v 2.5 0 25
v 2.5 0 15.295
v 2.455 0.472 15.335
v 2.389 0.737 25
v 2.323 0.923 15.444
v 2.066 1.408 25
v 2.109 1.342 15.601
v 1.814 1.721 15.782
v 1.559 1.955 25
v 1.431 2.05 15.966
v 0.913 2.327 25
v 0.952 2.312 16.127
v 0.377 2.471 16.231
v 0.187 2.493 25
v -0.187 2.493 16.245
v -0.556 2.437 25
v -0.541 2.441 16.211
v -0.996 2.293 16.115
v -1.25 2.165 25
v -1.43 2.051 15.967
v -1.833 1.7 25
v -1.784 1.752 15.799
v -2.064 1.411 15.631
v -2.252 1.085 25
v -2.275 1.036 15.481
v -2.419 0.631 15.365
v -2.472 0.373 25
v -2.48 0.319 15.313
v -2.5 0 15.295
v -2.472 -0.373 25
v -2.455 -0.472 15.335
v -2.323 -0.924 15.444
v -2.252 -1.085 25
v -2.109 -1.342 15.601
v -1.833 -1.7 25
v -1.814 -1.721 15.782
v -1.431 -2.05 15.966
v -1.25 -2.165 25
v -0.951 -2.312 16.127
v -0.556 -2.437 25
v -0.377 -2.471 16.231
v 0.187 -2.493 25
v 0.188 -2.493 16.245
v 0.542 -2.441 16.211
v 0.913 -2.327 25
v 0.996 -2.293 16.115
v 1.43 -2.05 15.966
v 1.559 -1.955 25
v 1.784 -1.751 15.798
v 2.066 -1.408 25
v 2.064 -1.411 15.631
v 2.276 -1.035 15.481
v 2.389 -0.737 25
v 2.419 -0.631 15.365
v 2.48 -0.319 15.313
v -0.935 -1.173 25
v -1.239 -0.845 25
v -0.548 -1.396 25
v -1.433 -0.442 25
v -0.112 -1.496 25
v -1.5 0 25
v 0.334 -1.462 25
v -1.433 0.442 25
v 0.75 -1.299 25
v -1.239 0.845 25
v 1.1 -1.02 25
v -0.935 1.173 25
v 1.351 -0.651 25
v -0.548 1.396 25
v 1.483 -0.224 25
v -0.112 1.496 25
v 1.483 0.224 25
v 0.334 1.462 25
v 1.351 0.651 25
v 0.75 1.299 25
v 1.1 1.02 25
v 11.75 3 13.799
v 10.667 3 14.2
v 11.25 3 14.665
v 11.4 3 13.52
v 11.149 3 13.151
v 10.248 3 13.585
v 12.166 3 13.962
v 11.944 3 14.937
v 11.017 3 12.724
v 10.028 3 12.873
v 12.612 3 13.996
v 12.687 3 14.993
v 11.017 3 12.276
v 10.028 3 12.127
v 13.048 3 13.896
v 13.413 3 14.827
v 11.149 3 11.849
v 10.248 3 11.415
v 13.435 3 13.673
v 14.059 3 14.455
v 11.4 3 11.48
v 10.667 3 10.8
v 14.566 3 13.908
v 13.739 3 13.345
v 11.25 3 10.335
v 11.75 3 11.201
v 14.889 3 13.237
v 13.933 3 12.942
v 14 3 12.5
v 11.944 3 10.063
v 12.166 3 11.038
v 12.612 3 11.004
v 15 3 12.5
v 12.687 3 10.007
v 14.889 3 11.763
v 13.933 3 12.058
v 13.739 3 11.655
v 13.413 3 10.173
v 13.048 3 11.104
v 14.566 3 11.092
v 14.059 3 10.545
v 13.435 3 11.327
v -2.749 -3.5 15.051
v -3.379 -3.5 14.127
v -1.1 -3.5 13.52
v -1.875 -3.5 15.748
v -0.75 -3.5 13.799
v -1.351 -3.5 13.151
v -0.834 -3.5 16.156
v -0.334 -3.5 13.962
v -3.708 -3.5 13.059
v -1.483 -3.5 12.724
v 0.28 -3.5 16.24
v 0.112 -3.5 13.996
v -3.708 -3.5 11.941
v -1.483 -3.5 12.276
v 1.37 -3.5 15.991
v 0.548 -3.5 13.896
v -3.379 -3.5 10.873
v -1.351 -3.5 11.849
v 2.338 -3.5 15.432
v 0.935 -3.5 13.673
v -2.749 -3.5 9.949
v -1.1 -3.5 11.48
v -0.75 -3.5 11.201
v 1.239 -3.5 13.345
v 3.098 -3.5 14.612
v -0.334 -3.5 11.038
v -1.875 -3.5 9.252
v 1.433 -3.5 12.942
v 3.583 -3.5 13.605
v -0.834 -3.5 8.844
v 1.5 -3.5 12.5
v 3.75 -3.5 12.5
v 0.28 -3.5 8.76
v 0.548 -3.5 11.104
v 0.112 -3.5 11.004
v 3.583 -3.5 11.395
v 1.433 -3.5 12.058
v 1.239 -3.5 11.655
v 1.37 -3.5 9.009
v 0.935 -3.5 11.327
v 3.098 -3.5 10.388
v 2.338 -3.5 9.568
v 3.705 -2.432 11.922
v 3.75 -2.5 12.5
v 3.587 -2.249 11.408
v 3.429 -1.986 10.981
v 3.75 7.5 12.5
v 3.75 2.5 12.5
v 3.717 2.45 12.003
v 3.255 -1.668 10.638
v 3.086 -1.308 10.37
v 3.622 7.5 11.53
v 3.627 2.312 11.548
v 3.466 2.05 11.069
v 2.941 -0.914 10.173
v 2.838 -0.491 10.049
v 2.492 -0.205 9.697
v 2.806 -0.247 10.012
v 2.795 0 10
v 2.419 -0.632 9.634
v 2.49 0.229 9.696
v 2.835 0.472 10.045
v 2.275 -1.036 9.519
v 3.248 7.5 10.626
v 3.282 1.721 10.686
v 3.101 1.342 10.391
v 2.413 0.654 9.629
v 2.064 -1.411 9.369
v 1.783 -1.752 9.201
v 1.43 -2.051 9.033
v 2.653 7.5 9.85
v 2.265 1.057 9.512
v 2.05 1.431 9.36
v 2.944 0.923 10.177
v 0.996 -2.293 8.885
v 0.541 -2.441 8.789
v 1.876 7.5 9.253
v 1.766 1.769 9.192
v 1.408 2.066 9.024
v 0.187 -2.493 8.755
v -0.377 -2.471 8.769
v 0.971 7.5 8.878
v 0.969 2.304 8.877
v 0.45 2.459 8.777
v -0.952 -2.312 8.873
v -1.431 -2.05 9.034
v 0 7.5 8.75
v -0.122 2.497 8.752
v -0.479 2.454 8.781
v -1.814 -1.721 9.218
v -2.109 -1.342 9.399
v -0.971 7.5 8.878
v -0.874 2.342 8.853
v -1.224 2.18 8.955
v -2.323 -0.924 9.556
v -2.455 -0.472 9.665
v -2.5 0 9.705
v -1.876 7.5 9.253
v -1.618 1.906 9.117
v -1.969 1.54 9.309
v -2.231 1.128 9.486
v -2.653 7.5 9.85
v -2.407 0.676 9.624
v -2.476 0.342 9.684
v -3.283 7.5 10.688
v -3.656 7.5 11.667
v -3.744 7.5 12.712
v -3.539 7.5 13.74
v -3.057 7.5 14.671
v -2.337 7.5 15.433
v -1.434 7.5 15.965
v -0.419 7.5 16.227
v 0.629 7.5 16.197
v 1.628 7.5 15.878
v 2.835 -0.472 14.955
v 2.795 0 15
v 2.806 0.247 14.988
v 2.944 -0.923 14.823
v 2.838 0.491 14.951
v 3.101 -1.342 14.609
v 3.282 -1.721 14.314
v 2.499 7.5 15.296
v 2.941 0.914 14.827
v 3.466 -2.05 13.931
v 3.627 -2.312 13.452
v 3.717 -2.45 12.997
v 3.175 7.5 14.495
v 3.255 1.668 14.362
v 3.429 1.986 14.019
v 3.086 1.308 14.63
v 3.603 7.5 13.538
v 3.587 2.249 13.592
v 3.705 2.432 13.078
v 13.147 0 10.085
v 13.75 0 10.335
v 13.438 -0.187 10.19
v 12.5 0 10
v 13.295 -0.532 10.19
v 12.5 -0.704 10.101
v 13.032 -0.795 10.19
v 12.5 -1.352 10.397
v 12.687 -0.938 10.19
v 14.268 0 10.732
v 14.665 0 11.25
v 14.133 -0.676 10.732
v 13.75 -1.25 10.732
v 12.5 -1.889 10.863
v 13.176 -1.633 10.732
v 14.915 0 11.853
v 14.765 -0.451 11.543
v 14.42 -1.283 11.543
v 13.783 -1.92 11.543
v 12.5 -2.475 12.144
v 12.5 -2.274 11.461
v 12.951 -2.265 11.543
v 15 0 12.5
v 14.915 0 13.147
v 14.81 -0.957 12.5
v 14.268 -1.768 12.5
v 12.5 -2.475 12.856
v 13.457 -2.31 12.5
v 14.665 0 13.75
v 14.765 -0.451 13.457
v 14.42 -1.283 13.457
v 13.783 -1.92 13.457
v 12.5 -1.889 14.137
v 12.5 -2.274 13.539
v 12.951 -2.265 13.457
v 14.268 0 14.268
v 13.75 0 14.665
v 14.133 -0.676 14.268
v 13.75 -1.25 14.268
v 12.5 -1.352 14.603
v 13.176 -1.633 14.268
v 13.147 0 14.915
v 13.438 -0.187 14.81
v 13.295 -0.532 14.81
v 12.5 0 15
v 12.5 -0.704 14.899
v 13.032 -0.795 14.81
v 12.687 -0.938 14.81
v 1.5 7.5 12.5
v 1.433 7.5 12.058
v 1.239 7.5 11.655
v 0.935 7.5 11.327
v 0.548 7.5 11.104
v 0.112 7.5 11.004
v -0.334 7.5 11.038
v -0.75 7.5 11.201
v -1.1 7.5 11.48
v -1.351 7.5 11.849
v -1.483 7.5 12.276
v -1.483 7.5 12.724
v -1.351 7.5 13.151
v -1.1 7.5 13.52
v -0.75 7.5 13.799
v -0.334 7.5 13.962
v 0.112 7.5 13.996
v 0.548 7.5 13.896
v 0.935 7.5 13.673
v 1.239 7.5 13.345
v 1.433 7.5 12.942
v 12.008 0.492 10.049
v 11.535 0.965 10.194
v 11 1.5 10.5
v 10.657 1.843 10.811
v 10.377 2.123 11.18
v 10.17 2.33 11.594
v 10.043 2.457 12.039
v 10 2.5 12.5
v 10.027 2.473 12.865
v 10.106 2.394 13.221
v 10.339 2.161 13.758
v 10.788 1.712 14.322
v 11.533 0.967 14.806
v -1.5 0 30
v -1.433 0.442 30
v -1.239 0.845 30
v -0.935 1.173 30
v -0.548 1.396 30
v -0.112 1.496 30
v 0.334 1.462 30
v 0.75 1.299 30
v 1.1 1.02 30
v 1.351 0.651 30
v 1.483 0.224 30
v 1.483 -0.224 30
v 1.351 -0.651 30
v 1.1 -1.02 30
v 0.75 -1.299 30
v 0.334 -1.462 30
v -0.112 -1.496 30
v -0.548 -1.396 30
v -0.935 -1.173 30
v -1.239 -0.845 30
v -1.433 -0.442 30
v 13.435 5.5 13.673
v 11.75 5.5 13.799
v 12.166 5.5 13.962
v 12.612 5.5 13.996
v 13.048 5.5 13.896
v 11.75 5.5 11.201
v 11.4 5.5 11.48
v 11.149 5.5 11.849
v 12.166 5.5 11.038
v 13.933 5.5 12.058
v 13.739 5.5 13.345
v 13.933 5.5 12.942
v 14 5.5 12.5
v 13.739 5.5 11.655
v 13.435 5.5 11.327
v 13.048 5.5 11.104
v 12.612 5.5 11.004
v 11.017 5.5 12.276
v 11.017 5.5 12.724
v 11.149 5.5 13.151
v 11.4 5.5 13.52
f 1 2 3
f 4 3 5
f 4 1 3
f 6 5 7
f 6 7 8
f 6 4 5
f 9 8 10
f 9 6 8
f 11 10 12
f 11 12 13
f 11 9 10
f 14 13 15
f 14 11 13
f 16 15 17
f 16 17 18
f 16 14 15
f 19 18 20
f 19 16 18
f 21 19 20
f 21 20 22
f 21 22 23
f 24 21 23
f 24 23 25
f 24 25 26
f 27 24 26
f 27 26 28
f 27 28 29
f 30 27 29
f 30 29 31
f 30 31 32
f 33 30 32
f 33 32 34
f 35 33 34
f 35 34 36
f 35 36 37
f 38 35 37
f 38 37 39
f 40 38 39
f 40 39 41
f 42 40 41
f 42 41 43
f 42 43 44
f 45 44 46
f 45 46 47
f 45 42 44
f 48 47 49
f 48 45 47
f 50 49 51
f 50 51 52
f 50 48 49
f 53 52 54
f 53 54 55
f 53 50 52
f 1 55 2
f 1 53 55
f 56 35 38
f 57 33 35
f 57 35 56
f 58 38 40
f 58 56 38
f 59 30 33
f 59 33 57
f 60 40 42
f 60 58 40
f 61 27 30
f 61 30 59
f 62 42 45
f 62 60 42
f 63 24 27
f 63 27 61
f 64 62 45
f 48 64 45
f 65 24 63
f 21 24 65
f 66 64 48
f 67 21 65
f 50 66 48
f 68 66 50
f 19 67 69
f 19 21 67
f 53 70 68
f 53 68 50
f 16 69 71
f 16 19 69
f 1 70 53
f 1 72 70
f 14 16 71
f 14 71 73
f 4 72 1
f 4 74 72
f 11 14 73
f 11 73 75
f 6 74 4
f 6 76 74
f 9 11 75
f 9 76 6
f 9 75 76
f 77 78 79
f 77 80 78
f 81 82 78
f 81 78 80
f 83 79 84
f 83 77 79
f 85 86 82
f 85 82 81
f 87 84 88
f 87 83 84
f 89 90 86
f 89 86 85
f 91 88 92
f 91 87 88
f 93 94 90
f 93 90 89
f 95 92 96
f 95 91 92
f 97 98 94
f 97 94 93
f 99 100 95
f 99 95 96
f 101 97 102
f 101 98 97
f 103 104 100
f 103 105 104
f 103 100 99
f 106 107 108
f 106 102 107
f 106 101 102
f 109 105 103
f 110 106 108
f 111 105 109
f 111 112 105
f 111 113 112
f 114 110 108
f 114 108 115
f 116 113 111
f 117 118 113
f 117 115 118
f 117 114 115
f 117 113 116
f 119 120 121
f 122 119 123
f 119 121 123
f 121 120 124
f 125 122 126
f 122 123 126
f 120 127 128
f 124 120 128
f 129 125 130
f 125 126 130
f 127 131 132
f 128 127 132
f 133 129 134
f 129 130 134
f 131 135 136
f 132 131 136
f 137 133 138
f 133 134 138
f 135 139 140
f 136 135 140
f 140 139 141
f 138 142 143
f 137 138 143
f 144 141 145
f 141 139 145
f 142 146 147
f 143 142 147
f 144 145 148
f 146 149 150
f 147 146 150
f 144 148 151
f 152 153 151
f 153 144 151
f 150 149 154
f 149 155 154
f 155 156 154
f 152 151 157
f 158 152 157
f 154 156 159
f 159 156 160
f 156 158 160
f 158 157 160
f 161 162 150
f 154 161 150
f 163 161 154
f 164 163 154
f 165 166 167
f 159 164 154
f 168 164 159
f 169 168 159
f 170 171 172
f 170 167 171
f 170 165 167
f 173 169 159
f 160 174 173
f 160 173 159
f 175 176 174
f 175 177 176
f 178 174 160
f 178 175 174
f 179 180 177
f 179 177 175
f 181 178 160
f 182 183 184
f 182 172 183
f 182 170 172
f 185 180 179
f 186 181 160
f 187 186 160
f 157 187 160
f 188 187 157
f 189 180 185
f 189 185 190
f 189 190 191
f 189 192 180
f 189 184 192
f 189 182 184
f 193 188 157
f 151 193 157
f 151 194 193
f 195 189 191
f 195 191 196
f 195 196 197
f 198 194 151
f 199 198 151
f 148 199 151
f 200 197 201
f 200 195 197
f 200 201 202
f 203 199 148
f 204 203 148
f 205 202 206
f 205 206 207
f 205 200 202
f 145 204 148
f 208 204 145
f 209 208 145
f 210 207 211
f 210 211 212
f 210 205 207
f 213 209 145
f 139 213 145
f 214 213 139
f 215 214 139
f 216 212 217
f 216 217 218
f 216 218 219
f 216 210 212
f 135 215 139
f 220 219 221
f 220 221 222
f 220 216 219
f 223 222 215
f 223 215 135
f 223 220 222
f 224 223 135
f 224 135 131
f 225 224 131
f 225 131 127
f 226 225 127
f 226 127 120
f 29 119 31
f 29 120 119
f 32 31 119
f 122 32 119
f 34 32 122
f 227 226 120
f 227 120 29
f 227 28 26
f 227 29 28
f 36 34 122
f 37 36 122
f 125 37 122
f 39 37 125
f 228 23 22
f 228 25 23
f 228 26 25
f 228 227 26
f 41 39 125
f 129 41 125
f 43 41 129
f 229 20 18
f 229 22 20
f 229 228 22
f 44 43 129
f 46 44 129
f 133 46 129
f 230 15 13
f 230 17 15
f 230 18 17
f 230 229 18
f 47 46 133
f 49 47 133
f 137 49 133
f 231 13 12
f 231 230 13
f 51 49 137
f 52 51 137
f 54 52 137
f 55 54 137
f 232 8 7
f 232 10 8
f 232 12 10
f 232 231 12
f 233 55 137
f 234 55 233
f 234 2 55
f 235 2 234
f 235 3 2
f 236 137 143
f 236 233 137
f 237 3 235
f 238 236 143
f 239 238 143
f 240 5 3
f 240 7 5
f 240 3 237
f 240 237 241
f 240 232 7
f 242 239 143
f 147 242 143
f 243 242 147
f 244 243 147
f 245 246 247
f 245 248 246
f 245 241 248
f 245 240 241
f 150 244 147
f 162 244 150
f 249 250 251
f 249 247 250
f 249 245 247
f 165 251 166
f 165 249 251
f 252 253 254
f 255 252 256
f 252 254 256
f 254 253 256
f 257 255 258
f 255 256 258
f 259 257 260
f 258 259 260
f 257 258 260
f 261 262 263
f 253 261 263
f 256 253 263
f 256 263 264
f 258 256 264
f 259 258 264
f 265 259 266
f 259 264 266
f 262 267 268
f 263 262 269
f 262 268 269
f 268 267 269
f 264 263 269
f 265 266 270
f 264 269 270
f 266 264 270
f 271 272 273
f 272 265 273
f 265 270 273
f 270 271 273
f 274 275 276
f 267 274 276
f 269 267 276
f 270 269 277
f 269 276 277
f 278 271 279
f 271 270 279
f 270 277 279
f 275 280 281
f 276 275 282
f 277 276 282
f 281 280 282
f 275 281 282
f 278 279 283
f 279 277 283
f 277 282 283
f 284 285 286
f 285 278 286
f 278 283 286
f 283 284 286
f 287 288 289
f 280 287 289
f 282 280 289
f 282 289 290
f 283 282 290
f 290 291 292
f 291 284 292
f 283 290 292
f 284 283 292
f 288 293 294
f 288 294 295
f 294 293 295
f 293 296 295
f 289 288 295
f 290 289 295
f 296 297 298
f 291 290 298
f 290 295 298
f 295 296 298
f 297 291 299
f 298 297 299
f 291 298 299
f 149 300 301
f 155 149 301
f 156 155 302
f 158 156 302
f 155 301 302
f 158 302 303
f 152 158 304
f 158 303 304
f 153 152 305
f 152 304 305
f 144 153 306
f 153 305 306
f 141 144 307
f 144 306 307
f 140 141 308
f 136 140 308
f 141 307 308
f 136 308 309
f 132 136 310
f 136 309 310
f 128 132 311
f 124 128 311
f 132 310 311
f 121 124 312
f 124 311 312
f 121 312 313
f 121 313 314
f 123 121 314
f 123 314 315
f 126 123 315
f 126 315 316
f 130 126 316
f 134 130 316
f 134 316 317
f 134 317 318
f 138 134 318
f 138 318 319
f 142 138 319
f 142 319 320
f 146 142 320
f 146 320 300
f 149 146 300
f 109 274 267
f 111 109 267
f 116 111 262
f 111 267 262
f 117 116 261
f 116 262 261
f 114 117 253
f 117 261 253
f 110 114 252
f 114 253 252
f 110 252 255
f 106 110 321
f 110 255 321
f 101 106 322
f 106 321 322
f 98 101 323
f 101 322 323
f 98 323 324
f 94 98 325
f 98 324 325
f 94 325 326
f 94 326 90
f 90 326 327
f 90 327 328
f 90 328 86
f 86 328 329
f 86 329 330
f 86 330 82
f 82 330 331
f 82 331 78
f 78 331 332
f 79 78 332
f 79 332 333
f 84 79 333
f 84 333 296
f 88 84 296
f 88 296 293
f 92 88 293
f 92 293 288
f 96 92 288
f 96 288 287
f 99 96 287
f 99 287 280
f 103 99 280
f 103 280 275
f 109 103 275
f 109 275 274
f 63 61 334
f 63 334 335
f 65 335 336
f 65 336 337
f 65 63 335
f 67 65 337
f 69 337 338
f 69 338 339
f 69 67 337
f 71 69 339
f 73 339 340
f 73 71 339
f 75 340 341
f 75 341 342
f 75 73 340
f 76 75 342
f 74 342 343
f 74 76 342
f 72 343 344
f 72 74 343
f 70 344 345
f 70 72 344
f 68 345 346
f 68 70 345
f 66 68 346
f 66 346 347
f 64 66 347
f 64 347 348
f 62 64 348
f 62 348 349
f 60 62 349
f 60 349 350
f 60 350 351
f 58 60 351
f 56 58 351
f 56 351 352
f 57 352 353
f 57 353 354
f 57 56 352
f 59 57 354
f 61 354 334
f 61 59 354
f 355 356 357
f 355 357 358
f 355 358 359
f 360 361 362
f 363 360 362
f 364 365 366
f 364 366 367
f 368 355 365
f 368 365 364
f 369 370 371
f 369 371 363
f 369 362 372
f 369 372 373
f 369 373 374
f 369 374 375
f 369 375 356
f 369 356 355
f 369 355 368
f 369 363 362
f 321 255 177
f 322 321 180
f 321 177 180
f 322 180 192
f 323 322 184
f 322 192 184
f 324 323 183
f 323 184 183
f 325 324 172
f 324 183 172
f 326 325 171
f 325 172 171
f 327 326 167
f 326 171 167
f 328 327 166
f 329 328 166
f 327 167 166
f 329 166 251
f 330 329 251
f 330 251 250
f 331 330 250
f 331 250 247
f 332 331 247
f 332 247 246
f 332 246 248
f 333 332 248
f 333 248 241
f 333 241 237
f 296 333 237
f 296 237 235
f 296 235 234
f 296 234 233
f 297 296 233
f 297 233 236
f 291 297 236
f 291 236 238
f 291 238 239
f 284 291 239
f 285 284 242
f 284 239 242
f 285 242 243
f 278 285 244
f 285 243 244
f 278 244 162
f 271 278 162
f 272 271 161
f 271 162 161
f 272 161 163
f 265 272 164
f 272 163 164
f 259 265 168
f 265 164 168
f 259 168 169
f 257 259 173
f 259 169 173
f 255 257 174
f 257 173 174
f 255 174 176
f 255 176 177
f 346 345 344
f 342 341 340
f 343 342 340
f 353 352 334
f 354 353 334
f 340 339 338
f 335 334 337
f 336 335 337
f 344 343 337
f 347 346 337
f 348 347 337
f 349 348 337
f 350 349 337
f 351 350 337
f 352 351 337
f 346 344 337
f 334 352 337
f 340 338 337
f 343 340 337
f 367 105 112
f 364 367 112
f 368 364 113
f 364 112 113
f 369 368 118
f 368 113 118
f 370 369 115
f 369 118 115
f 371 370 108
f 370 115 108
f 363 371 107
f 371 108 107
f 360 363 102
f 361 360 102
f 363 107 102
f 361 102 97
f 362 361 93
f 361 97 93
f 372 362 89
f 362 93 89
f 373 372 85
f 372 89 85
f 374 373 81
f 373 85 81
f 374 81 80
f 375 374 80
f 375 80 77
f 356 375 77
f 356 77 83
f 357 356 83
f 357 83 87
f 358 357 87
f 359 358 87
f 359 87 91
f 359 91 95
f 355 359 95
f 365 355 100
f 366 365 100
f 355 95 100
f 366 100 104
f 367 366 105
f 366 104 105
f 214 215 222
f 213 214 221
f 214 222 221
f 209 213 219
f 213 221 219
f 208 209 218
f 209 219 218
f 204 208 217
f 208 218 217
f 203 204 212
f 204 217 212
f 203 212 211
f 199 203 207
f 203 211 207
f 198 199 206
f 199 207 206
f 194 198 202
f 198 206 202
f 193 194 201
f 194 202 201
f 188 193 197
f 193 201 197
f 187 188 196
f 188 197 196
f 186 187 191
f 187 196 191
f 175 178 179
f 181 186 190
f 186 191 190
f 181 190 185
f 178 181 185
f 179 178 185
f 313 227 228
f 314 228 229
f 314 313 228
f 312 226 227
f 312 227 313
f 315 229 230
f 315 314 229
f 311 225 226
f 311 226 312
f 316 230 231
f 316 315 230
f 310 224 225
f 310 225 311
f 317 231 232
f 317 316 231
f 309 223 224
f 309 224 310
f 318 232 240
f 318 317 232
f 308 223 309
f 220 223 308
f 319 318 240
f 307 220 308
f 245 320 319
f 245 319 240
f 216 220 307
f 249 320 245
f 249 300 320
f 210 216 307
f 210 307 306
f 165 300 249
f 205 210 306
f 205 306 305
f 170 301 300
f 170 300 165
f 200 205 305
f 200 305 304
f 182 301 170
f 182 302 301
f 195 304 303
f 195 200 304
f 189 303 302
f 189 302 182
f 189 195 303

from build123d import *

# Parameters (mm, degrees)
SKETCH1_R                = 2.5
BOSS_EXTRUDE1_DEPTH      = 12.5
SKETCH2_R                = 1.5
BOSS_EXTRUDE2_DEPTH      = 5
SKETCH4_R                = 2.5
BOSS_EXTRUDE3_DEPTH      = 12.5
SKETCH5_R                = 2.5
BOSS_EXTRUDE4_DEPTH      = 3
SKETCH6_R                = 1.5
BOSS_EXTRUDE5_DEPTH      = 2.5
REVOLVE2_ANGLE           = 90
REVOLVE3_ANGLE           = 90
SKETCH18_R               = 3.75
BOSS_EXTRUDE6_DEPTH      = 7.5
BOSS_EXTRUDE6_DEPTH_BACK = 3.5
SKETCH20_R               = 1.5
CUT_EXTRUDE2_DEPTH       = 1.0000001
CUT_EXTRUDE2_DEPTH_BACK  = 12.0000001
CUT_EXTRUDE3_DEPTH       = 1.0000001
CUT_EXTRUDE3_DEPTH_BACK  = 12.0000001


with BuildPart() as part:
    # Sketch1 → Boss-Extrude1 (new body)
    with BuildSketch(Plane.XY):
        Circle(SKETCH1_R)
    boss_extrude1 = extrude(amount=BOSS_EXTRUDE1_DEPTH)

    # Sketch2 → Boss-Extrude2 (add)
    with BuildSketch(Plane(origin=(0, 0, 0), x_dir=(-1, 0, 0), z_dir=(0, 0, -1))):
        Circle(SKETCH2_R)
    boss_extrude2 = extrude(amount=BOSS_EXTRUDE2_DEPTH)

    # Sketch4 → Boss-Extrude3 (add)
    with BuildSketch(Plane(origin=(0, 0, 0), x_dir=(0, 0, -1), z_dir=(1, 0, 0))):
        with Locations((-12.5, 0)):
            Circle(SKETCH4_R)
    extrude(amount=BOSS_EXTRUDE3_DEPTH)

    # Sketch5 → Boss-Extrude4 (add)
    with BuildSketch(Plane(origin=(0, 0, 0), x_dir=(1, 0, 0), z_dir=(0, 1, 0))):
        with Locations((12.5, -12.5)):
            Circle(SKETCH5_R)
    extrude(amount=BOSS_EXTRUDE4_DEPTH)

    # Sketch6 → Boss-Extrude5 (add)
    with BuildSketch(Plane(origin=(0, 3, 0), x_dir=(1, 0, 0), z_dir=(0, 1, 0))):
        with Locations((12.5, -12.5)):
            Circle(SKETCH6_R)
    extrude(amount=BOSS_EXTRUDE5_DEPTH)

    # Sketch8 → Revolve2 (revolve)
    with BuildSketch(Plane.ZY):
        with BuildLine():
            Line((12.5, 2.5), (12.5, -2.5))
            ThreePointArc((12.5, -2.5), (15, 0), (12.5, 2.5))
        make_face()
    revolve(axis=Axis((0, 2.5, 12.5), (0, -1, 0)), revolution_arc=REVOLVE2_ANGLE)

    # Sketch16 → Revolve3 (revolve)
    with BuildSketch(Plane.XZ):
        with BuildLine():
            Line((12.5, 15), (12.5, 10))
            ThreePointArc((12.5, 10), (15, 12.5), (12.5, 15))
        make_face()
    revolve(axis=Axis((12.5, 0, 15), (0, 0, -1)), revolution_arc=REVOLVE3_ANGLE)

    # Sketch18 → Boss-Extrude6 (add, two sides)
    with BuildSketch(Plane(origin=(0, 0, 0), x_dir=(1, 0, 0), z_dir=(0, 1, 0))) as boss_extrude6_sk:
        with Locations((0, -12.5)):
            Circle(SKETCH18_R)
    extrude(amount=BOSS_EXTRUDE6_DEPTH)
    extrude(boss_extrude6_sk.sketch, amount=-BOSS_EXTRUDE6_DEPTH_BACK)

    # Mirror1: Boss-Extrude1, Boss-Extrude2 across plane
    add(boss_extrude1.mirror(Plane.XY.offset(12.5)))
    add(boss_extrude2.mirror(Plane.XY.offset(12.5)))

    # Sketch20 → Cut-Extrude2 (cut, two sides)
    with BuildSketch(Plane(origin=(0, 7.5, 0), x_dir=(1, 0, 0), z_dir=(0, 1, 0))) as cut_extrude2_sk:
        with Locations((0, -12.5)):
            Circle(SKETCH20_R)
    extrude(amount=CUT_EXTRUDE2_DEPTH, mode=Mode.SUBTRACT)
    extrude(cut_extrude2_sk.sketch, amount=-CUT_EXTRUDE2_DEPTH_BACK, mode=Mode.SUBTRACT)

    # Sketch21 → Cut-Extrude3 (cut, two sides)
    with BuildSketch(Plane(origin=(0, 7.5, 0), x_dir=(1, 0, 0), z_dir=(0, 1, 0))) as cut_extrude3_sk:
        with BuildLine():
            Line((2.653299832, -9.85), (12.281852951, 10.075018896))
            Line((12.281852951, 10.075018896), (-12.7945827, 9.436331987))
            Line((-12.7945827, 9.436331987), (-2.653299832, -9.85))
            ThreePointArc((-2.653299832, -9.85), (0, -8.75), (2.653299832, -9.85))
        make_face()
    extrude(amount=CUT_EXTRUDE3_DEPTH, mode=Mode.SUBTRACT)
    extrude(cut_extrude3_sk.sketch, amount=-CUT_EXTRUDE3_DEPTH_BACK, mode=Mode.SUBTRACT)


solid = part.part
